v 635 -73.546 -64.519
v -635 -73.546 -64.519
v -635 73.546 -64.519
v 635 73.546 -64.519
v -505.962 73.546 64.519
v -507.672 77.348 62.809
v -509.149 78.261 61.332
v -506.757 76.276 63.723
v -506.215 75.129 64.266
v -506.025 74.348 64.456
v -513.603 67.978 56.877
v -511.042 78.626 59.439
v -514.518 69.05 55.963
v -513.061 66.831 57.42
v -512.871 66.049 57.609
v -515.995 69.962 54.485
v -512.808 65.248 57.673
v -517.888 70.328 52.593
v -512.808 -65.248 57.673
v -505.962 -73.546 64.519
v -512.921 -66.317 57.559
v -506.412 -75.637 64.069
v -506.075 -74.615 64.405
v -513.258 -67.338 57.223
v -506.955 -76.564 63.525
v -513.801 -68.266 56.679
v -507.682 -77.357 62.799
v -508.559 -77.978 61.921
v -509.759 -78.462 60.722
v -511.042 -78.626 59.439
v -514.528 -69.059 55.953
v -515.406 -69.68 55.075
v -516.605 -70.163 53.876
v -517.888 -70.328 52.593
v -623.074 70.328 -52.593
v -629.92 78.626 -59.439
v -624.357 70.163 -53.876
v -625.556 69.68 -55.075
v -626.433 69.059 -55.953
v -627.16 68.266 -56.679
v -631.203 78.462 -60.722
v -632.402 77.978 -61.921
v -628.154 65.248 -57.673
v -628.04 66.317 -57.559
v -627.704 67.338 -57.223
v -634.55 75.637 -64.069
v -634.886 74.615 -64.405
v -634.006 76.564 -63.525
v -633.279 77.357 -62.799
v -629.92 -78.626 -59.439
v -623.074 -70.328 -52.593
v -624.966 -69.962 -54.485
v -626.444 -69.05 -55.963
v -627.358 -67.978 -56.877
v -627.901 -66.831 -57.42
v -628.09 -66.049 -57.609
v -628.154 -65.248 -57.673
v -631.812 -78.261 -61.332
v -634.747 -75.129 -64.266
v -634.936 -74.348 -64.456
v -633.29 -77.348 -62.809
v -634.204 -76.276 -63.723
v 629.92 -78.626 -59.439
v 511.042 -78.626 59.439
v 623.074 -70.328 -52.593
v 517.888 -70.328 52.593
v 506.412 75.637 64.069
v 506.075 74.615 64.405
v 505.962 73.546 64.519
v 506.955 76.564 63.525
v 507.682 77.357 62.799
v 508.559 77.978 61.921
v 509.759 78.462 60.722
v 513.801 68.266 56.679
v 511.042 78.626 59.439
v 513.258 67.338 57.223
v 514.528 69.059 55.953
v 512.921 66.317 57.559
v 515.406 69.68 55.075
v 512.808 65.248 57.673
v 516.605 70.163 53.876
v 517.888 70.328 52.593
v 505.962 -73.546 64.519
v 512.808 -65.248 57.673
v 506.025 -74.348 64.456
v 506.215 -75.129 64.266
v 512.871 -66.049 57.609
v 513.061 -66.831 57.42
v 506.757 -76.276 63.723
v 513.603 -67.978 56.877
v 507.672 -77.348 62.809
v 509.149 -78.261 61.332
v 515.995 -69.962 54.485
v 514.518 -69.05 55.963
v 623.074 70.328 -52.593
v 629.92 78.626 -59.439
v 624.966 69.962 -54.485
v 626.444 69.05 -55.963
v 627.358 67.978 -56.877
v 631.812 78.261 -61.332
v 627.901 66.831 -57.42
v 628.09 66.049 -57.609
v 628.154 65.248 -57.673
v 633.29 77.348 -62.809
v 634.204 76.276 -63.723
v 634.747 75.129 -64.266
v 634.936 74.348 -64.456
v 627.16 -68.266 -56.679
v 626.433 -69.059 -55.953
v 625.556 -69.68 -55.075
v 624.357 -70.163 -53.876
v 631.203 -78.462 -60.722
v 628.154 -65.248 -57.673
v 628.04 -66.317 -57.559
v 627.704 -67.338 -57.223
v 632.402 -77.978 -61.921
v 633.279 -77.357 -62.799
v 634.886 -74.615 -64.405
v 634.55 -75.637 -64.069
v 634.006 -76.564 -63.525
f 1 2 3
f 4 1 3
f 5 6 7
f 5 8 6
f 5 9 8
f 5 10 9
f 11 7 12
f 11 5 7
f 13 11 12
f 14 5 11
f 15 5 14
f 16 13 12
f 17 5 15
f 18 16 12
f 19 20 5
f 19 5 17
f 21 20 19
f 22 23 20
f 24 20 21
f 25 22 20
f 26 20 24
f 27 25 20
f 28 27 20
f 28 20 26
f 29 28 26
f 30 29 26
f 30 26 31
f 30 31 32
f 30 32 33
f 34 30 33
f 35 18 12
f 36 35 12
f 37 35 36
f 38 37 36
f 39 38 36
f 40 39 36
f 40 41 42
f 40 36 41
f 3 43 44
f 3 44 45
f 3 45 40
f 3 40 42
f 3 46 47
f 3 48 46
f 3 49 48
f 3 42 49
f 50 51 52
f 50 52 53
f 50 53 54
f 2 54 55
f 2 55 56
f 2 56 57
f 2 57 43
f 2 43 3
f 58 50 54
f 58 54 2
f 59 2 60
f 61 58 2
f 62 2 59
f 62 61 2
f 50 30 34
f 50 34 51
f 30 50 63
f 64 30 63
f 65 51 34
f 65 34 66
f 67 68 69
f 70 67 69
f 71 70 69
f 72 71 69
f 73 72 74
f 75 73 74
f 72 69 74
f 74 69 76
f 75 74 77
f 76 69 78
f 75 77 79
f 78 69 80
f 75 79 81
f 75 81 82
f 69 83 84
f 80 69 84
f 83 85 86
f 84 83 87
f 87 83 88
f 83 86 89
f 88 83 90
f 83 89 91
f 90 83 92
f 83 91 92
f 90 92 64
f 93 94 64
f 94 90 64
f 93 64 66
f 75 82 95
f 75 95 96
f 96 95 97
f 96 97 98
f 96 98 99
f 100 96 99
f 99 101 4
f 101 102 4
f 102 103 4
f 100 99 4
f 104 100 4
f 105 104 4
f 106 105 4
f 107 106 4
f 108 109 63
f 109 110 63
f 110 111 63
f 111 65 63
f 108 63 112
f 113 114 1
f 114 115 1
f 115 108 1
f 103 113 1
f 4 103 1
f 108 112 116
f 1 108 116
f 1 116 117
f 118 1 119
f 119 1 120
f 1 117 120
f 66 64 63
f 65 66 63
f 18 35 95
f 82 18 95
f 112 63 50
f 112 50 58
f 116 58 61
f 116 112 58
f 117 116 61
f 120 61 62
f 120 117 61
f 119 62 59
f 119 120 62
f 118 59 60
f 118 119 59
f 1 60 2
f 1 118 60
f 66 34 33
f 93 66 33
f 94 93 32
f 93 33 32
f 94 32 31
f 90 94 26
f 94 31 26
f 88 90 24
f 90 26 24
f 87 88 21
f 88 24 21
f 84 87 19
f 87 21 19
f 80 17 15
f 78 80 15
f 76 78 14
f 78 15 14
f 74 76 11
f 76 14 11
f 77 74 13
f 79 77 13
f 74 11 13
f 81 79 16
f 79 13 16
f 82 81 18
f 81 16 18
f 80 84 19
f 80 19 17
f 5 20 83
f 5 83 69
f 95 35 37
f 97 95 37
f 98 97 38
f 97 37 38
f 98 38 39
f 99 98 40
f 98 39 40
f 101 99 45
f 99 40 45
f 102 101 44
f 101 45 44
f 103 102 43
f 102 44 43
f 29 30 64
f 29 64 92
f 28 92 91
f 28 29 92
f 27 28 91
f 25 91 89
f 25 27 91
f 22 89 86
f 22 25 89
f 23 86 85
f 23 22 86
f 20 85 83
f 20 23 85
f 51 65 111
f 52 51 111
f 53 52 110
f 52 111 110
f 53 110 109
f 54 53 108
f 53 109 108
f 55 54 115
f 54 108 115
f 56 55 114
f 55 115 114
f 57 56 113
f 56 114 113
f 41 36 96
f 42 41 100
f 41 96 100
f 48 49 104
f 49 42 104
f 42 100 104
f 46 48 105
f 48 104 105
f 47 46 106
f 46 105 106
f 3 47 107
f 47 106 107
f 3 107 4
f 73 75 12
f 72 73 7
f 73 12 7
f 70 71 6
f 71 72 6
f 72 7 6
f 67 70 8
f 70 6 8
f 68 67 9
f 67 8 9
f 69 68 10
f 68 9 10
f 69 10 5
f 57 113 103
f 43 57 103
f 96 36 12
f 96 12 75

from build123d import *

# Parameters (mm, degrees)
F0_W     = 157.2524309158
F0_H     = 129.0383934975
F0_W_2   = 140.655875206
F0_H_2   = 115.3461933136
F1_DEPTH = 635
F2_R     = 5.08
F4_DEPTH = 157.2534309158


# Not quite as in the source:
# - a pattern or mirror of a feature is missing from the dataset's text; its kind, count and spacing are read off the source's solid


with BuildPart() as f1:
    # F0 (on Right) → F1 (new body, symmetric)
    with BuildSketch(Plane.YZ):
        Rectangle(F0_W, F0_H)
        Rectangle(F0_W_2, F0_H_2, mode=Mode.SUBTRACT)
    extrude(amount=F1_DEPTH, both=True)

    # F2
    f2_edges = [f1.edges().sort_by_distance(p)[0] for p in [
        (0, -78.626215, 64.519197),
        (0, -70.327938, 57.673097),
        (0, 70.327938, 57.673097),
        (0, 78.626215, 64.519197),
        (0, 78.626215, -64.519197),
        (0, 70.327938, -57.673097),
        (0, -70.327938, -57.673097),
        (0, -78.626215, -64.519197),
    ]]
    fillet(f2_edges, radius=F2_R)

    # F3 (on face) → F4 (cut, through all)
    with BuildSketch(Plane.XZ.offset(78.6262154579)):
        Polygon((635, -64.5191967487), (635, 64.5191967487), (505.9616065025, 64.5191967487), align=None)
    f4 = extrude(amount=-F4_DEPTH, mode=Mode.SUBTRACT)

    # F4_copies: F4 across plane
    add(f4.mirror(Plane(origin=(0, 0, 0), x_dir=(0, 0, -1), z_dir=(-1, 0, 0))), mode=Mode.SUBTRACT)


solid = f1.part
